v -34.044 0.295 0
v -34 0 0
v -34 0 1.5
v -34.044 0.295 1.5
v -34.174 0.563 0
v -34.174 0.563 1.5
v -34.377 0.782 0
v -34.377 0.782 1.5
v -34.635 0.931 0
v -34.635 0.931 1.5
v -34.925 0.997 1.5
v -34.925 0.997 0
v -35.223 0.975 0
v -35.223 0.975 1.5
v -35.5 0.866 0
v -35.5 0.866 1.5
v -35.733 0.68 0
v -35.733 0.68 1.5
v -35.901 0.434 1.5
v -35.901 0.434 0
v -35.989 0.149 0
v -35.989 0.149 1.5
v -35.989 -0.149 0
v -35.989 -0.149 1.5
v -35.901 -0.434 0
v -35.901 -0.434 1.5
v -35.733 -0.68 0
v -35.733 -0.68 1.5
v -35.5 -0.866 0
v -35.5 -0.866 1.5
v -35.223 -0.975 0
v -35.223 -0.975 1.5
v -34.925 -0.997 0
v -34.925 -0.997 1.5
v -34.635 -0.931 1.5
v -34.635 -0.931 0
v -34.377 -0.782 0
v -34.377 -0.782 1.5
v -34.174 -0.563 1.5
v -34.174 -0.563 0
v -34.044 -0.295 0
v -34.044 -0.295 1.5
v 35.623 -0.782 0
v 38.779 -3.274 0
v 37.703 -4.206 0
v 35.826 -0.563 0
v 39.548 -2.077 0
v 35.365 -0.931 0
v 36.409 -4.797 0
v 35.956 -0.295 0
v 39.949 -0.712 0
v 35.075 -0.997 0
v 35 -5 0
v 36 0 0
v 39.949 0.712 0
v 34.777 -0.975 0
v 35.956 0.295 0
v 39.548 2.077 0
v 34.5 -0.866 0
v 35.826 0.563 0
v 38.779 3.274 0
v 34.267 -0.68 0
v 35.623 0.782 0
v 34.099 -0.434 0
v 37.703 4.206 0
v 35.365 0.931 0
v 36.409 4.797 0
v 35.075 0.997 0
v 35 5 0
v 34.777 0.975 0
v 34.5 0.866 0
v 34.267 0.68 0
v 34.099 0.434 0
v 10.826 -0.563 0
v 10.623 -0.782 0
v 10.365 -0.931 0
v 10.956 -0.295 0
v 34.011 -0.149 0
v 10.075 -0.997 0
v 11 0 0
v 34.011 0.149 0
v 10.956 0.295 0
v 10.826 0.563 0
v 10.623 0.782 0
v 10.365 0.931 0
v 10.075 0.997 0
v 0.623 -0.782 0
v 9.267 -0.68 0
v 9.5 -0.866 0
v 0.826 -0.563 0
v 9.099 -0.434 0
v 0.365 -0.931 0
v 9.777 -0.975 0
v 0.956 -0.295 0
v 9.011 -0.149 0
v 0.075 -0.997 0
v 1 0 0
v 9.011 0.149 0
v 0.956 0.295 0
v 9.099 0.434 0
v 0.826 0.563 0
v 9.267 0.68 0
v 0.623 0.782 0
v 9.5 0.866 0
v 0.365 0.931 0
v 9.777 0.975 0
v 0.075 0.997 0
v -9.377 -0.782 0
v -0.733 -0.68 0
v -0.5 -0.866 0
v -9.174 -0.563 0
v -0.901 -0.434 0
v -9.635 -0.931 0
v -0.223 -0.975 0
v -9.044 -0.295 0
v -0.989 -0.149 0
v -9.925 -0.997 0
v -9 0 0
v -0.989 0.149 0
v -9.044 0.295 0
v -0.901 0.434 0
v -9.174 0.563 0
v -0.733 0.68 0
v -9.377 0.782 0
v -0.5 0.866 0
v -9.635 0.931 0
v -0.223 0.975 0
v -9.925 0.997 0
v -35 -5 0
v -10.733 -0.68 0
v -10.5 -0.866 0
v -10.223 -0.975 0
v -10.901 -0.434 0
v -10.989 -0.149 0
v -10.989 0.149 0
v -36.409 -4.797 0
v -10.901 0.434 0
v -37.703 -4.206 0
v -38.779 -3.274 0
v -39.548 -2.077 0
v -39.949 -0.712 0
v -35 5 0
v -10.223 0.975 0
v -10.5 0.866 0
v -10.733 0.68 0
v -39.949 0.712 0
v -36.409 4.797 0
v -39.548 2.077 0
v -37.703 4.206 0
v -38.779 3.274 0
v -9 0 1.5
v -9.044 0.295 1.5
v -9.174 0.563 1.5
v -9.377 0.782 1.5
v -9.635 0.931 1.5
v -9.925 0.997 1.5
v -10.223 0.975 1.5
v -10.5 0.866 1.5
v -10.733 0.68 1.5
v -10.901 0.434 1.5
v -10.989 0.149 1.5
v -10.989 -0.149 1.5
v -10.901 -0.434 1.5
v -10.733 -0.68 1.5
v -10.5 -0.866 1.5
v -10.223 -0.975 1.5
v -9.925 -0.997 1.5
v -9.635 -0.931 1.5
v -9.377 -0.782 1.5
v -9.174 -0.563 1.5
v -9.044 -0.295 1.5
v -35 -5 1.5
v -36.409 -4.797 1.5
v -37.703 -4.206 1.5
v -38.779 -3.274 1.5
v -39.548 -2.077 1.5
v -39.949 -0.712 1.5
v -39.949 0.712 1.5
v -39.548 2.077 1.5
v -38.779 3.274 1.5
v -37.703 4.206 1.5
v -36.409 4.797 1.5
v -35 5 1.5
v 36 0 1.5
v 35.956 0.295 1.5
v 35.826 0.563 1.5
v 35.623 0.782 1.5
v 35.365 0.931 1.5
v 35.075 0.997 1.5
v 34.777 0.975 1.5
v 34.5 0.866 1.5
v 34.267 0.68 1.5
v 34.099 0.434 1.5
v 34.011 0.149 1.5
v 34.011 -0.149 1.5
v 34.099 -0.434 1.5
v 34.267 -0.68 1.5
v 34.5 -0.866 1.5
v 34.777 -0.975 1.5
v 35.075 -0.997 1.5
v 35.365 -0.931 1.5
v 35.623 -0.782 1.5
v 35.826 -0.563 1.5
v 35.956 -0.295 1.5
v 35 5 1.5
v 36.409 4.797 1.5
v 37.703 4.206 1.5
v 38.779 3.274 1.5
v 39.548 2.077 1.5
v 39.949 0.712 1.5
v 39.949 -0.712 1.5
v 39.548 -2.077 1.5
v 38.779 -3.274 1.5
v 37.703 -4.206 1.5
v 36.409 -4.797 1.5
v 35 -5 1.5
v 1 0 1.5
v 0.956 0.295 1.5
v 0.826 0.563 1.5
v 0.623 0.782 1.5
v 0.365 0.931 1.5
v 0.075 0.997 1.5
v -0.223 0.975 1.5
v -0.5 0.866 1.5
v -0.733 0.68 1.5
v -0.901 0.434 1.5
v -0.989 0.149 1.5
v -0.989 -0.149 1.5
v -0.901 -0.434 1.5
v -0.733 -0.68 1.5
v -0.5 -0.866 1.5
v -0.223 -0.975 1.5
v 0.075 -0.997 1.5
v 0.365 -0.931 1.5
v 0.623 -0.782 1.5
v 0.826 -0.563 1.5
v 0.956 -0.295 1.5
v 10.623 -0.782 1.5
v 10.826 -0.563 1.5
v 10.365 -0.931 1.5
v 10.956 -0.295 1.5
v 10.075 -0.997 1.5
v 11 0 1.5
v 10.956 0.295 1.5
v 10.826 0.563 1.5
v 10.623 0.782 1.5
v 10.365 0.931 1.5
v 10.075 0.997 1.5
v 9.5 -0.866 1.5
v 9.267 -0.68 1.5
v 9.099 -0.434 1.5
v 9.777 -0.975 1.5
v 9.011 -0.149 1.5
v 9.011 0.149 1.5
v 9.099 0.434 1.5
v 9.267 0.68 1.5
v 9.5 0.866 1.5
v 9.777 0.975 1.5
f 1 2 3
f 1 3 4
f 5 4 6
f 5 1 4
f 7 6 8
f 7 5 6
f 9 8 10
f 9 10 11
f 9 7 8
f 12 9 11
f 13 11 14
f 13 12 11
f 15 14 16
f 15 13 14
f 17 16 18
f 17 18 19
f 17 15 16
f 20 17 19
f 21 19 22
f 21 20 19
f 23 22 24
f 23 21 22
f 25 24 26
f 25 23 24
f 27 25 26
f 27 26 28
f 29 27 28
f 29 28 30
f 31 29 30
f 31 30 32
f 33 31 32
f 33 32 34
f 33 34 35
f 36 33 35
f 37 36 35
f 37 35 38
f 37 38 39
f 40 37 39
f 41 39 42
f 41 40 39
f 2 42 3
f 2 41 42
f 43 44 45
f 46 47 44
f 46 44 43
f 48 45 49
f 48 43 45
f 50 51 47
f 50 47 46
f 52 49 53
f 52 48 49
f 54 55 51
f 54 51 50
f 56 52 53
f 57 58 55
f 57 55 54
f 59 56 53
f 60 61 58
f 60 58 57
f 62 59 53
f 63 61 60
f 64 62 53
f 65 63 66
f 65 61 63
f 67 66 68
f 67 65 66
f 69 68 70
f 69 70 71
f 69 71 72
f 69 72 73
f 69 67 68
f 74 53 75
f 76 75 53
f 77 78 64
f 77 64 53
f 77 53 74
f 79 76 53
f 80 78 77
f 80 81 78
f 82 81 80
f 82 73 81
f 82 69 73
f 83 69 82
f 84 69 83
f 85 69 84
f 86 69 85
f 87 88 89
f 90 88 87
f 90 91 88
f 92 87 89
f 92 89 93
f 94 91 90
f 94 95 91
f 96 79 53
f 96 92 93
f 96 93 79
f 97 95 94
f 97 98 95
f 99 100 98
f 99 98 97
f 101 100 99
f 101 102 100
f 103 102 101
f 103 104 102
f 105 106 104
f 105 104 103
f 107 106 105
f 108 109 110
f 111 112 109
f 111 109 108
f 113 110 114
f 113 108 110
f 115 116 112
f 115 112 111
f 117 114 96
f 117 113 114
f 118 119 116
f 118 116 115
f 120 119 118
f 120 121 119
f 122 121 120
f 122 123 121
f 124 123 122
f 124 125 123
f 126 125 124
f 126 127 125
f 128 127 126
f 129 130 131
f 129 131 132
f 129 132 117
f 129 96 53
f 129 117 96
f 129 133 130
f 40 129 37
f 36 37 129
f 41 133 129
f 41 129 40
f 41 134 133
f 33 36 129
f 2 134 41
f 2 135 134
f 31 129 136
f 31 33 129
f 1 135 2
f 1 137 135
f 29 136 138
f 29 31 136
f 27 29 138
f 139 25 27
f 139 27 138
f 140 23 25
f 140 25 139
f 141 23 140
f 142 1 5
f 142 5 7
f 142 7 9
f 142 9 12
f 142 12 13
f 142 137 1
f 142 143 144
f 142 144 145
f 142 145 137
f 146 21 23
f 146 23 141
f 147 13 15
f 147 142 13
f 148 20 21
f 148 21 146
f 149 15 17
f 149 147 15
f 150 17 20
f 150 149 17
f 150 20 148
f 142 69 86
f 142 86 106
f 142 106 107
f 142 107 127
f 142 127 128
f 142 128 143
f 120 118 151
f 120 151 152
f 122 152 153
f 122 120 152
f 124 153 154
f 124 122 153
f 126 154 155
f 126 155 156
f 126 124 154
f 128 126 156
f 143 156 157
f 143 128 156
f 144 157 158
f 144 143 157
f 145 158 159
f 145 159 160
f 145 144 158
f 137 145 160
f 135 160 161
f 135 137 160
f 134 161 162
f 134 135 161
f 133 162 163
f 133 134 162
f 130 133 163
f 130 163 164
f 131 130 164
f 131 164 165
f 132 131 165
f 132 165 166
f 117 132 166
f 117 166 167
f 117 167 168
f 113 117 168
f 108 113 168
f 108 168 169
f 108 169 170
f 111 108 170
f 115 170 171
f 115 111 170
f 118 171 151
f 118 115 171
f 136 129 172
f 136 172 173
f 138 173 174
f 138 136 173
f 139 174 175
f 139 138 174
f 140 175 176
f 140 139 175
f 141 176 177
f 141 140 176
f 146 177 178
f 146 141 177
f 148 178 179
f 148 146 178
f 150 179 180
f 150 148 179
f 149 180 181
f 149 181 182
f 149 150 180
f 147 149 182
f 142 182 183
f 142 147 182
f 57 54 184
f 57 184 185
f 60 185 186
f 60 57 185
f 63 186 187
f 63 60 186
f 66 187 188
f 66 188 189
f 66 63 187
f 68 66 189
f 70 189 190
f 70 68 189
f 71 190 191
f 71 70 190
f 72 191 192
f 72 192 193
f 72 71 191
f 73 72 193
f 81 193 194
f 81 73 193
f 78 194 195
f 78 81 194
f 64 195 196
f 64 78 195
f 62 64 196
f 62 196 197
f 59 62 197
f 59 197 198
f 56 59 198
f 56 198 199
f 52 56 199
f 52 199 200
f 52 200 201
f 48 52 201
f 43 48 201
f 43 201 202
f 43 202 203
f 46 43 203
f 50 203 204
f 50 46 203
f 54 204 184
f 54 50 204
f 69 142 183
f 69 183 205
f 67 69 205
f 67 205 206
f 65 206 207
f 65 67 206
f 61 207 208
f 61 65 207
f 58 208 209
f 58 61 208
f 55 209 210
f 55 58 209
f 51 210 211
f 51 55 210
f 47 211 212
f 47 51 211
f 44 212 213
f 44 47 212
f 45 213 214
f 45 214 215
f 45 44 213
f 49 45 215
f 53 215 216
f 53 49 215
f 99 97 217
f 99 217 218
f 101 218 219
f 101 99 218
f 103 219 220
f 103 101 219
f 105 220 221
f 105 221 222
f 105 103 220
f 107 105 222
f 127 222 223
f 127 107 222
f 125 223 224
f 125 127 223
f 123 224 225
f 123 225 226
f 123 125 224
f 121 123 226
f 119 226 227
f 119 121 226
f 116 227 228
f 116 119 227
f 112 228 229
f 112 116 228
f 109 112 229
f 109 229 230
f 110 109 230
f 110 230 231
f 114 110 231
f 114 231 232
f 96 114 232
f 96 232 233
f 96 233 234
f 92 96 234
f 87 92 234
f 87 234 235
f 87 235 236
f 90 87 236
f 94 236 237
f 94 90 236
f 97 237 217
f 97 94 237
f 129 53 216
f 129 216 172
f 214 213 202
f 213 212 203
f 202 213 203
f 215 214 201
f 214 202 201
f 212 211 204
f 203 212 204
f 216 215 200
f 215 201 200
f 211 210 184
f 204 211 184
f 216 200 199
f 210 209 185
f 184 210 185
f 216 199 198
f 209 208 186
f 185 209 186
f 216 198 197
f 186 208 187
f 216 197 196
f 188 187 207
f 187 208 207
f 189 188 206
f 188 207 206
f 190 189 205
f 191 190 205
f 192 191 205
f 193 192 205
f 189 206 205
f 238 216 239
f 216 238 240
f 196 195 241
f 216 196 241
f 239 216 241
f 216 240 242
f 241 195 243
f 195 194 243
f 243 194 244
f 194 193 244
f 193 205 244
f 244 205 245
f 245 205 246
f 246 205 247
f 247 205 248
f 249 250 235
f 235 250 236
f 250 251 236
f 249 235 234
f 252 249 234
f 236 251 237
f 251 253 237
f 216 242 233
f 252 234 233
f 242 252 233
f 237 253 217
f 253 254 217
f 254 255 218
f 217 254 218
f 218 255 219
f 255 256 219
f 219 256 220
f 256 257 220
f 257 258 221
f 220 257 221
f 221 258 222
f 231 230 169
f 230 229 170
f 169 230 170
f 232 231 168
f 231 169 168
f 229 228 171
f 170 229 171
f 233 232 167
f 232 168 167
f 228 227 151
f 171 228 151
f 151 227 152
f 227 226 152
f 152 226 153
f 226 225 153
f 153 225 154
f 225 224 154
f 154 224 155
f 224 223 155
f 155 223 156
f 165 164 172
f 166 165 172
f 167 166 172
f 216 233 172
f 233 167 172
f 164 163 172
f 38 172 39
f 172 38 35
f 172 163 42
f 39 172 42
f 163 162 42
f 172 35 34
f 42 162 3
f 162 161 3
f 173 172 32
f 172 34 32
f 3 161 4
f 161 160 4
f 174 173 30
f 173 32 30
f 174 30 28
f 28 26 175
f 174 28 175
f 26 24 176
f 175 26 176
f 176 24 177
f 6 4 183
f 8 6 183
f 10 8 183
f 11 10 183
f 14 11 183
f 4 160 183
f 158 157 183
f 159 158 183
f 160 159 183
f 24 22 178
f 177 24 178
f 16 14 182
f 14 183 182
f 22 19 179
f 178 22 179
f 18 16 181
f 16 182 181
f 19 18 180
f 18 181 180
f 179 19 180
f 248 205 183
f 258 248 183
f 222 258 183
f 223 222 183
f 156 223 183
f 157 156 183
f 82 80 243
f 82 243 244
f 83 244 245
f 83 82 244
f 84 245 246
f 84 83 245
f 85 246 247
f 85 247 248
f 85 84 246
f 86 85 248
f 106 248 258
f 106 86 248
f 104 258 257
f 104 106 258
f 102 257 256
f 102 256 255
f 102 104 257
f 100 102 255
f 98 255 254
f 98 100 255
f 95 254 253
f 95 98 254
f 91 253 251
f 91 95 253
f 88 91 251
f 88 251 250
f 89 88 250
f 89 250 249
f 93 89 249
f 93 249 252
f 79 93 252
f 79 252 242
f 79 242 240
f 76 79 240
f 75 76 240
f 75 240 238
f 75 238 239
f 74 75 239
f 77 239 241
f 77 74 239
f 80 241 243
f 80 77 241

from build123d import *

# Parameters (mm, degrees)
ESQUISSE1_R        = 1
BOSS_EXTRU_2_DEPTH = 1.5


with BuildPart() as part:
    # Esquisse1 → Boss.-Extru.2 (new body)
    with BuildSketch(Plane.XY):
        with BuildLine():
            Line((-35, 5), (35, 5))
            ThreePointArc((35, 5), (40, 0), (35, -5))
            Line((35, -5), (-35, -5))
            ThreePointArc((-35, -5), (-40, 0), (-35, 5))
        make_face()
        with Locations((-35, 0)):
            Circle(ESQUISSE1_R, mode=Mode.SUBTRACT)
        Circle(ESQUISSE1_R, mode=Mode.SUBTRACT)
        with Locations((35, 0)):
            Circle(ESQUISSE1_R, mode=Mode.SUBTRACT)
        with Locations((-10, 0)):
            Circle(ESQUISSE1_R, mode=Mode.SUBTRACT)
        with Locations((10, 0)):
            Circle(ESQUISSE1_R, mode=Mode.SUBTRACT)
    extrude(amount=BOSS_EXTRU_2_DEPTH)


solid = part.part
